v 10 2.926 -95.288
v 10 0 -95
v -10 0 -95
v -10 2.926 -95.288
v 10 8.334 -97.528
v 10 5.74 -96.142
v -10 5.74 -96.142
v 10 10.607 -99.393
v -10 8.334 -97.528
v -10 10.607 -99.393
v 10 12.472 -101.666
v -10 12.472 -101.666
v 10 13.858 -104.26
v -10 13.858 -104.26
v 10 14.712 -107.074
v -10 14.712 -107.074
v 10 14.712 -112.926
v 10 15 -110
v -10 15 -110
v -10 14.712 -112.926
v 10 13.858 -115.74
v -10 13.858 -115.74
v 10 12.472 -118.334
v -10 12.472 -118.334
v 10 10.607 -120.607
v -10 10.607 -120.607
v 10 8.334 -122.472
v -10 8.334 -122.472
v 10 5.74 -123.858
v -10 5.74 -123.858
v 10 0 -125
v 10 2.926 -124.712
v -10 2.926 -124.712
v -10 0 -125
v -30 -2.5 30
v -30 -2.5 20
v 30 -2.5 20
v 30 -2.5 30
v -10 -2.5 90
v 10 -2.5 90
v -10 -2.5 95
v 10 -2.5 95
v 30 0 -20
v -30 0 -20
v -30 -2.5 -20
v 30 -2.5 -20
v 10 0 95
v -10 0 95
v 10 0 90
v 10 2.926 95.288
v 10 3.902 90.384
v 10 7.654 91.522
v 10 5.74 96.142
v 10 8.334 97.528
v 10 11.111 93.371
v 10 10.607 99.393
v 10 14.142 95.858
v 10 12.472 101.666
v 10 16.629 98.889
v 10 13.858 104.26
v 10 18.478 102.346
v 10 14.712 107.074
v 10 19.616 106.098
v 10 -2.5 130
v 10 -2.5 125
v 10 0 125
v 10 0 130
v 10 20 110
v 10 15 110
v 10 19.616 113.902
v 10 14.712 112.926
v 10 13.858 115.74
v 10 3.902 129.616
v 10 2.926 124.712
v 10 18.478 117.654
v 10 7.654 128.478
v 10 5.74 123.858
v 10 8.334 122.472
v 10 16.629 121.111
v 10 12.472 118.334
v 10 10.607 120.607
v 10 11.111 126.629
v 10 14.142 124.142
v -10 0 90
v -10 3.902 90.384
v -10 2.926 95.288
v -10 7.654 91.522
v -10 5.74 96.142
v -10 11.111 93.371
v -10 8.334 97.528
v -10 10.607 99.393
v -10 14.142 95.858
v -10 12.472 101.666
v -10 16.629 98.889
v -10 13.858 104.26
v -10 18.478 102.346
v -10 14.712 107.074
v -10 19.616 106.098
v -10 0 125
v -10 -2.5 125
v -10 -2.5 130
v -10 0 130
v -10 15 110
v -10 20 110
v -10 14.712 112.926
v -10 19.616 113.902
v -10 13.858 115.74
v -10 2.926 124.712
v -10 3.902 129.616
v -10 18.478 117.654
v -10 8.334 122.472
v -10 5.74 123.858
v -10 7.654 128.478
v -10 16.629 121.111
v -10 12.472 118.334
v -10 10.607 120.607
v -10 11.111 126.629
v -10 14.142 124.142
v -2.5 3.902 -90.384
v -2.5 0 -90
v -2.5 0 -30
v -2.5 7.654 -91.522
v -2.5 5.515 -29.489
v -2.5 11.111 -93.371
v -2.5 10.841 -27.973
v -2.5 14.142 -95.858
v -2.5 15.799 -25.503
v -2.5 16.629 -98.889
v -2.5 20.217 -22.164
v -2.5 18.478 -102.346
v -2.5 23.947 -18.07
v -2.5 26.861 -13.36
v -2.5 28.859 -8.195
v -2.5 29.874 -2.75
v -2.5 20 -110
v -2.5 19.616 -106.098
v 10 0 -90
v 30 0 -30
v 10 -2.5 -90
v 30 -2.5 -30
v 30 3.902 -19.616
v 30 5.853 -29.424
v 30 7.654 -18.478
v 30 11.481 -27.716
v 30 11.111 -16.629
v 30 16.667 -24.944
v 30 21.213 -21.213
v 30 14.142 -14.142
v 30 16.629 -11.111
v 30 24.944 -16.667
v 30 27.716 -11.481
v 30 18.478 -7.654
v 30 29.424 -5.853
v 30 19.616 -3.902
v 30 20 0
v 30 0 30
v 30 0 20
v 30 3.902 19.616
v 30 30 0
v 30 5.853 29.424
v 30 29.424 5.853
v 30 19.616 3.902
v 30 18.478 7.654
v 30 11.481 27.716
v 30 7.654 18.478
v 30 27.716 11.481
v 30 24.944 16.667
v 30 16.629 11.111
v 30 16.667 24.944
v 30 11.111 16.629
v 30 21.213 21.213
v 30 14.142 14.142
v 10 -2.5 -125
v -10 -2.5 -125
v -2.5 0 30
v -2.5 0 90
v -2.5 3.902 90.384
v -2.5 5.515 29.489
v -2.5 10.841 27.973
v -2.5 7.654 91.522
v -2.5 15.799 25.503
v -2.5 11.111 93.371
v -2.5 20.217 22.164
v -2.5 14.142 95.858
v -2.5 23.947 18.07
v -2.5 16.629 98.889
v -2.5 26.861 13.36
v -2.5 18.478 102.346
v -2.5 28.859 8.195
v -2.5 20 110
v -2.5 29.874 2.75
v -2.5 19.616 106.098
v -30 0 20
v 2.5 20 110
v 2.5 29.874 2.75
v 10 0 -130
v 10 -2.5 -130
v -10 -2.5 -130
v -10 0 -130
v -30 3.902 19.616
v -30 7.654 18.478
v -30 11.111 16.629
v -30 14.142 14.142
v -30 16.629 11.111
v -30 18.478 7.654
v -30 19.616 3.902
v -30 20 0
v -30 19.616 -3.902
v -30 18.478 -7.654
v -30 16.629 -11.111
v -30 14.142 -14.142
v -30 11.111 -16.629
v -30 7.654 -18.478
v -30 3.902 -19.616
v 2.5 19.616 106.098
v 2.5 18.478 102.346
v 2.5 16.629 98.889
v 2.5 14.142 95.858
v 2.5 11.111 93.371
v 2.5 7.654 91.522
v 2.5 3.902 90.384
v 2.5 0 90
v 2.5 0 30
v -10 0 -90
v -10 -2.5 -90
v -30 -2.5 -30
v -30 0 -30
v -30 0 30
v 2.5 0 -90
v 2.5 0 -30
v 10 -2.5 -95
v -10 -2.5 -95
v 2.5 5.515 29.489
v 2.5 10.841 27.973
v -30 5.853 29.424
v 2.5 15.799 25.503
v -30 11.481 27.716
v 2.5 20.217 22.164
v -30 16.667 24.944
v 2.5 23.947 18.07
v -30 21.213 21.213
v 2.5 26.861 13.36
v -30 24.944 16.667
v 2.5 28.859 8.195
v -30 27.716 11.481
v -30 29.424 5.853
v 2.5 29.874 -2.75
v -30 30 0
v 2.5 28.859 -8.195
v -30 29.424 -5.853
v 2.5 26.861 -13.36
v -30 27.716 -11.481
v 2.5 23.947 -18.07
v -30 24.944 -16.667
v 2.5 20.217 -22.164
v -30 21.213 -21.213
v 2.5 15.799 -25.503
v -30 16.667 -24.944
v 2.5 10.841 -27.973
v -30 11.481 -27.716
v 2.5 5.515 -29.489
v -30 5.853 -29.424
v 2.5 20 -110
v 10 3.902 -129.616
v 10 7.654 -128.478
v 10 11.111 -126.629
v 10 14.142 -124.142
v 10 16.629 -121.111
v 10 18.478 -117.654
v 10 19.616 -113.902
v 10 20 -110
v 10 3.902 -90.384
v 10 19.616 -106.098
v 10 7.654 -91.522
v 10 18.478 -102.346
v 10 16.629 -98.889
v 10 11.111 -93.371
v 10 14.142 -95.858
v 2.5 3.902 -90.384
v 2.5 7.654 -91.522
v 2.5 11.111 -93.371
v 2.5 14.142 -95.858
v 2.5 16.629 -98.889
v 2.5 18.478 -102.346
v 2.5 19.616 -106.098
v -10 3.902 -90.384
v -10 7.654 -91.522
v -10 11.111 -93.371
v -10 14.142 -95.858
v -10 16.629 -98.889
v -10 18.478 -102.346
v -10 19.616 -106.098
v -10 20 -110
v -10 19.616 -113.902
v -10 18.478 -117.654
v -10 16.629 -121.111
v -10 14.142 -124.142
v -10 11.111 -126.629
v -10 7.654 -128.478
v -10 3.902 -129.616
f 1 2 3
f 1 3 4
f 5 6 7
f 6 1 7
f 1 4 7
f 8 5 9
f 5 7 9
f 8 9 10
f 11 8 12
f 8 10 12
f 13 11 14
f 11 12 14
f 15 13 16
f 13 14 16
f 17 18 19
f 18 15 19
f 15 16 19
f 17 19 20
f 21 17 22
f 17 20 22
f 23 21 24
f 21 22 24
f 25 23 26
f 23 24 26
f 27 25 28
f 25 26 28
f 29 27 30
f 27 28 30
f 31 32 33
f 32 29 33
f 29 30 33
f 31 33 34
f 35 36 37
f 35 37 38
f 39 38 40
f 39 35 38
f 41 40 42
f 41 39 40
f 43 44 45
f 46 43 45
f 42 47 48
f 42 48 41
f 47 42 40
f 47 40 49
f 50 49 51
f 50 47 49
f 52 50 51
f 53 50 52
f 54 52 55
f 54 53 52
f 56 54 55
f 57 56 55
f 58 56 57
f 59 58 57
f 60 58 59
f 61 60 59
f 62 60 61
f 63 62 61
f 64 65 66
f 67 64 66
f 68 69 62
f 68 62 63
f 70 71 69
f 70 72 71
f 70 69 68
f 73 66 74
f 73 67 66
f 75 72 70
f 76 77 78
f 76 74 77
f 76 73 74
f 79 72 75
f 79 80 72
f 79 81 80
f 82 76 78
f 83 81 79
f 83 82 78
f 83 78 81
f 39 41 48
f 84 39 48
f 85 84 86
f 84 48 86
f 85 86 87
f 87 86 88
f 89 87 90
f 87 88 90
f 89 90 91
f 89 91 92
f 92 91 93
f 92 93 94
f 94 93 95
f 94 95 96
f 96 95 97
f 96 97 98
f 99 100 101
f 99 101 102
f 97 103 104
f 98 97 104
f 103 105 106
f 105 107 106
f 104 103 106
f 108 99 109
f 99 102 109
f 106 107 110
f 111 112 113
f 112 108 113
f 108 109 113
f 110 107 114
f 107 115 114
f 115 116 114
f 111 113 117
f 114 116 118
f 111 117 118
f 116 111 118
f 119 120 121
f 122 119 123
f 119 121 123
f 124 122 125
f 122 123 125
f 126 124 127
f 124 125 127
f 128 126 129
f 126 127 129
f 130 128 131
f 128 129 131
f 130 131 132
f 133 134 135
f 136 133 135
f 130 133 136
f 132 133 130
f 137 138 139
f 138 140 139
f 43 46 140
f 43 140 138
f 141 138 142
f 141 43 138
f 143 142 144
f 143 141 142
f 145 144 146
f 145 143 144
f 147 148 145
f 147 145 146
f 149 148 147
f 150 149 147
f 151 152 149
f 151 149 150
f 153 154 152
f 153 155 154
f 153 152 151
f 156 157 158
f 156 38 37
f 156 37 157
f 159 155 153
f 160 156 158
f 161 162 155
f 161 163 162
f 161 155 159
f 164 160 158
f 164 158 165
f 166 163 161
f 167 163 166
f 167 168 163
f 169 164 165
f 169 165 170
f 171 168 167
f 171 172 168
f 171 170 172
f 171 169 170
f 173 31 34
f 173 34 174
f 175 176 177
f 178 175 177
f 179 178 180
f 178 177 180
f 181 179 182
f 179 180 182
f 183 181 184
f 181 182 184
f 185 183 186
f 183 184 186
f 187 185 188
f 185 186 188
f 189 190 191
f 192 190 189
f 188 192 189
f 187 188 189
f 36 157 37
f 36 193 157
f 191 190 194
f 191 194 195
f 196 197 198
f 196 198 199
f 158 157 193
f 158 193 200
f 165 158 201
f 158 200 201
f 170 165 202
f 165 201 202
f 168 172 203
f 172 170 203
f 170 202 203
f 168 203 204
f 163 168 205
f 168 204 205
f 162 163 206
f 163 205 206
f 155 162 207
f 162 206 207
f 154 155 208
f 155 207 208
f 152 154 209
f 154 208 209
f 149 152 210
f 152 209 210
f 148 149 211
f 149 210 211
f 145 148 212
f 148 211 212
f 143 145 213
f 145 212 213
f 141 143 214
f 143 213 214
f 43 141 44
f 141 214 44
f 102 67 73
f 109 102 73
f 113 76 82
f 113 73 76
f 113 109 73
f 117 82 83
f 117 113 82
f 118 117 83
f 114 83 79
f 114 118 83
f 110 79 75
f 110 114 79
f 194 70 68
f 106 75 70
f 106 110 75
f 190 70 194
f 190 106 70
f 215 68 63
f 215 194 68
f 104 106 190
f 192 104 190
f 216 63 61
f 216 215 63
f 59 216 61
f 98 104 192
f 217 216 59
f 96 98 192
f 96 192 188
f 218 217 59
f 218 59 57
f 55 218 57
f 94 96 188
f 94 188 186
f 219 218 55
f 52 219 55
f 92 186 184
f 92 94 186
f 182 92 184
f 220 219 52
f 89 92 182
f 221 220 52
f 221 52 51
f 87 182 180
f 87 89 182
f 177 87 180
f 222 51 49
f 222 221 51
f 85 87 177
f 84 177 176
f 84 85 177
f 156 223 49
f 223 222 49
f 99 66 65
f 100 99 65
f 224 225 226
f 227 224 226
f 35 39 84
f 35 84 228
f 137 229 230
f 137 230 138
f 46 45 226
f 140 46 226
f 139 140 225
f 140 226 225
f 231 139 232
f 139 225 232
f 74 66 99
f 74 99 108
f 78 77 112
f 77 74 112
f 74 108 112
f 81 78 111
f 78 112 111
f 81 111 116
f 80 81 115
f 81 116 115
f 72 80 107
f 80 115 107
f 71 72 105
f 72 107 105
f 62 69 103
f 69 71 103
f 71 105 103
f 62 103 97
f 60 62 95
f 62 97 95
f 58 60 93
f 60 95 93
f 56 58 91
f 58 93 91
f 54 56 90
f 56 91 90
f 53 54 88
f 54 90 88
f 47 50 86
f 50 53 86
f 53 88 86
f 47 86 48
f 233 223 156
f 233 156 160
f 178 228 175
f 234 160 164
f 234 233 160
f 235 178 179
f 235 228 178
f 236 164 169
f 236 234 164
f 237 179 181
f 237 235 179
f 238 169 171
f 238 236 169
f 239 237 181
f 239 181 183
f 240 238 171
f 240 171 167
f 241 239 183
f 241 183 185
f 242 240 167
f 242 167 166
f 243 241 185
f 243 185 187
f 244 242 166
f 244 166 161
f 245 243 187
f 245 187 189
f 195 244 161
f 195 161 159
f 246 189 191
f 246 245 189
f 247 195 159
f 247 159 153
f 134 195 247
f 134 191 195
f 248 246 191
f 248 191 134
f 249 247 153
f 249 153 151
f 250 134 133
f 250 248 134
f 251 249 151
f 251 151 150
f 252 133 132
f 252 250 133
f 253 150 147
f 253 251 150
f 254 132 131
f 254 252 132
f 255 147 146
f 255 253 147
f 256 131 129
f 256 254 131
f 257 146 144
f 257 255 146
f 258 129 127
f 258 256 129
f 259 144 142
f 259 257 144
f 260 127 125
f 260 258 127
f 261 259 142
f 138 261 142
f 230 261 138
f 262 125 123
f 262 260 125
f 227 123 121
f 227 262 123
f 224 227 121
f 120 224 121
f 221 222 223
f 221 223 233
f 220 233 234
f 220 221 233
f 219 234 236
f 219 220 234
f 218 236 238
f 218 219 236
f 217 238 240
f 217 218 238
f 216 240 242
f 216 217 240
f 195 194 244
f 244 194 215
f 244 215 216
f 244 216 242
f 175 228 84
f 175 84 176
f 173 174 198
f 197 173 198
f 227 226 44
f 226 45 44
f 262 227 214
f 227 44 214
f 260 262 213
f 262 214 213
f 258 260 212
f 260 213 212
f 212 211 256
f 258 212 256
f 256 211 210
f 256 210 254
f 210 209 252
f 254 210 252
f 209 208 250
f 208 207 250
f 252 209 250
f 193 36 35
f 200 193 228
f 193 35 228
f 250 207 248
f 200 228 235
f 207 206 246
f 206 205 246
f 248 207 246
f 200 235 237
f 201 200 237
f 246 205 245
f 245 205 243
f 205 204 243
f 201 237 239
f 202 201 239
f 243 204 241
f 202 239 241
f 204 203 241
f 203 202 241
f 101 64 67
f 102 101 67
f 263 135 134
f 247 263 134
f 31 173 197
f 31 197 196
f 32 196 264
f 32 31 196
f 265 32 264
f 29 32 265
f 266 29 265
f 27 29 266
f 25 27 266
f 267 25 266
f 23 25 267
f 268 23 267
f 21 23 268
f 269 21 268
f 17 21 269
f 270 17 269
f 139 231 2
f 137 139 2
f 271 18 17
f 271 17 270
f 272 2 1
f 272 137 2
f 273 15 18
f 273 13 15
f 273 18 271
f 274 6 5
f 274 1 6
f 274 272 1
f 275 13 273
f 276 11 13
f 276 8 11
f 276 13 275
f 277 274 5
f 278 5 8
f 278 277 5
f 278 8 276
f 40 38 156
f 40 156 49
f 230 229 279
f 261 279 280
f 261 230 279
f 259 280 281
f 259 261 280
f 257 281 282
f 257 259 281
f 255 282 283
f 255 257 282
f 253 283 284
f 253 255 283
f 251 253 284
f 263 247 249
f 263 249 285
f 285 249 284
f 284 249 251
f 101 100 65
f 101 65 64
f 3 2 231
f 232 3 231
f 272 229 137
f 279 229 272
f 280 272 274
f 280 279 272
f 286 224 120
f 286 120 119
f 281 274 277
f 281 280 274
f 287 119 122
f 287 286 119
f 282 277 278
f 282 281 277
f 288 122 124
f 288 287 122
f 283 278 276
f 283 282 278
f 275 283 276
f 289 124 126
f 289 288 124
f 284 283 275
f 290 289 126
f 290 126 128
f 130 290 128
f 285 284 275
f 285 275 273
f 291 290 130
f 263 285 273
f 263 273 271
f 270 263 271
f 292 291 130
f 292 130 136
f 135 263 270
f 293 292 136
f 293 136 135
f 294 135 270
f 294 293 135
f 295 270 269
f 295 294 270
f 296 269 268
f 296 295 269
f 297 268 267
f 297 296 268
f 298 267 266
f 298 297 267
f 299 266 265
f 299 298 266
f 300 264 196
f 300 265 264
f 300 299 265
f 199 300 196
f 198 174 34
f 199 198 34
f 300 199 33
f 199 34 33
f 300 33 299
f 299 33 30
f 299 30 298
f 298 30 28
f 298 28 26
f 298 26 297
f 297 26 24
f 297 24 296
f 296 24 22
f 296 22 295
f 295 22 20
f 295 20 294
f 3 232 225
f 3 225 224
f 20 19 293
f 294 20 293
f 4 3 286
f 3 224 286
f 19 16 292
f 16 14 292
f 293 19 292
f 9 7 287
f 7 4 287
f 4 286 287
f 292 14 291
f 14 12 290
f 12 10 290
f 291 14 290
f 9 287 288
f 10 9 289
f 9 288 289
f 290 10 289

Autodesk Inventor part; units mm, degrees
ref_plane "YZ Plane" through (0, 0, 0) normal (1, 0, 0) x (0, 1, 0)
ref_plane "XZ Plane" through (0, 0, 0) normal (0, 1, 0) x (-1, 0, 0)
ref_plane "XY Plane" through (0, 0, 0) normal (0, 0, 1) x (1, 0, 0)
sketch "Boceto1" plane through (0, 0, 0) normal (1, 0, 0) x (0, 1, 0)
  arc A0 (0, -20) -> (0, 20) centre (0, 0) ccw
  arc A1 (0, -30) -> (0, 30) centre (0, 0) ccw
  line L0 (0, 0) -> (-5, 0) construction
  arc A2 (0, -125) -> (0, -95) centre (0, -110) ccw
  arc A3 (0, -130) -> (0, -90) centre (0, -110) ccw
  arc A4 (0, 95) -> (0, 125) centre (0, 110) ccw
  arc A5 (0, 90) -> (0, 130) centre (0, 110) ccw
  line L1 (0, 95) -> (-2.5, 95)
  line L2 (-2.5, 95) -> (-2.5, 90)
  line L3 (-2.5, 90) -> (0, 90)
  line L4 (0, 125) -> (-2.5, 125)
  line L5 (-2.5, 125) -> (-2.5, 130)
  line L6 (-2.5, 130) -> (0, 130)
  line L7 (0, -95) -> (-2.5, -95)
  line L8 (-2.5, -95) -> (-2.5, -90)
  line L9 (-2.5, -90) -> (0, -90)
  line L10 (0, -125) -> (-2.5, -125)
  line L11 (-2.5, -125) -> (-2.5, -130)
  line L12 (-2.5, -130) -> (0, -130)
  line L13 (0, 20) -> (-2.5, 20)
  line L14 (-2.5, 20) -> (-2.5, 30)
  line L15 (-2.5, 30) -> (0, 30)
  line L16 (0, -20) -> (-2.5, -20)
  line L17 (-2.5, -20) -> (-2.5, -30)
  line L18 (-2.5, -30) -> (0, -30)
  point P0 (0, 130)
  dimension "d0" = 20
  dimension "d1" = 30
  dimension "d2" = 5
  dimension "d3" = 15
  dimension "d5" = 20
  dimension "d6" = 110
  dimension "d7" = 2.5
  dimension "d8" = 5
  dimension "d9" = 5
  dimension "d10" = 10
  dimension "d11" = 10
  dimension "d16" = 2.5
extrude "Extrusión1" add sketch "Boceto1" along normal mid plane 60 contours A0 L13 L14 L15 A1 L18 L17 L16
extrude "Extrusión2" add sketch "Boceto1" along normal mid plane 20 contours A2 L7 L8 L9 A3 L12 L11 L10 | A4 L4 L5 L6 A5 L3 L2 L1
sketch "Boceto2" plane through (-30, -2.5, 20) normal (0, -1, 0) x (1, 0, 0)
  line L0 (40, 70) -> (20, 70) projected
  line L1 (40, 75) -> (40, 70) projected
  line L2 (60, 10) -> (40, 70)
  line L3 (0, 10) -> (60, 10) projected
  line L4 (20, 70) -> (0, 10)
  line L5 (60, -40) -> (60, -50) projected
  line L6 (60, -50) -> (40, -110)
  line L7 (20, -110) -> (0, -50)
  line L8 (0, -50) -> (60, -50) projected
  line L9 (60, -50) -> (0, -50)
  line L10 (60, 10) -> (60, 0) projected
  line L11 (60, 10) -> (0, 10)
  line L12 (20, -110) -> (40, -110) projected
  line L13 (40, -110) -> (20, -110)
  point P0 (30, -20)
extrude "Extrusión3" add sketch "Boceto2" against normal blind 2.5
sketch "Boceto3" plane through (0, 0, 0) normal (1, 0, 0) x (0, 1, 0)
  arc A0 (0, -130) -> (0, -90) centre (0, -110) ccw projected
  line L0 (20, -110) -> (29.8737, -2.7502)
  arc A1 (0, -30) -> (0, 30) centre (0, 0) ccw projected
  arc A2 (0, 90) -> (0, 130) centre (0, 110) ccw projected
  line L1 (20, 110) -> (29.9301, 2.1377)
  line L2 (0, -30) -> (0, -90) projected
  line L3 (0, 90) -> (0, 30) projected
  point P0 (29.8737, 2.7502)
extrude "Extrusión4" add sketch "Boceto3" along normal mid plane 5
properties part number "Pieza de practica 10"
